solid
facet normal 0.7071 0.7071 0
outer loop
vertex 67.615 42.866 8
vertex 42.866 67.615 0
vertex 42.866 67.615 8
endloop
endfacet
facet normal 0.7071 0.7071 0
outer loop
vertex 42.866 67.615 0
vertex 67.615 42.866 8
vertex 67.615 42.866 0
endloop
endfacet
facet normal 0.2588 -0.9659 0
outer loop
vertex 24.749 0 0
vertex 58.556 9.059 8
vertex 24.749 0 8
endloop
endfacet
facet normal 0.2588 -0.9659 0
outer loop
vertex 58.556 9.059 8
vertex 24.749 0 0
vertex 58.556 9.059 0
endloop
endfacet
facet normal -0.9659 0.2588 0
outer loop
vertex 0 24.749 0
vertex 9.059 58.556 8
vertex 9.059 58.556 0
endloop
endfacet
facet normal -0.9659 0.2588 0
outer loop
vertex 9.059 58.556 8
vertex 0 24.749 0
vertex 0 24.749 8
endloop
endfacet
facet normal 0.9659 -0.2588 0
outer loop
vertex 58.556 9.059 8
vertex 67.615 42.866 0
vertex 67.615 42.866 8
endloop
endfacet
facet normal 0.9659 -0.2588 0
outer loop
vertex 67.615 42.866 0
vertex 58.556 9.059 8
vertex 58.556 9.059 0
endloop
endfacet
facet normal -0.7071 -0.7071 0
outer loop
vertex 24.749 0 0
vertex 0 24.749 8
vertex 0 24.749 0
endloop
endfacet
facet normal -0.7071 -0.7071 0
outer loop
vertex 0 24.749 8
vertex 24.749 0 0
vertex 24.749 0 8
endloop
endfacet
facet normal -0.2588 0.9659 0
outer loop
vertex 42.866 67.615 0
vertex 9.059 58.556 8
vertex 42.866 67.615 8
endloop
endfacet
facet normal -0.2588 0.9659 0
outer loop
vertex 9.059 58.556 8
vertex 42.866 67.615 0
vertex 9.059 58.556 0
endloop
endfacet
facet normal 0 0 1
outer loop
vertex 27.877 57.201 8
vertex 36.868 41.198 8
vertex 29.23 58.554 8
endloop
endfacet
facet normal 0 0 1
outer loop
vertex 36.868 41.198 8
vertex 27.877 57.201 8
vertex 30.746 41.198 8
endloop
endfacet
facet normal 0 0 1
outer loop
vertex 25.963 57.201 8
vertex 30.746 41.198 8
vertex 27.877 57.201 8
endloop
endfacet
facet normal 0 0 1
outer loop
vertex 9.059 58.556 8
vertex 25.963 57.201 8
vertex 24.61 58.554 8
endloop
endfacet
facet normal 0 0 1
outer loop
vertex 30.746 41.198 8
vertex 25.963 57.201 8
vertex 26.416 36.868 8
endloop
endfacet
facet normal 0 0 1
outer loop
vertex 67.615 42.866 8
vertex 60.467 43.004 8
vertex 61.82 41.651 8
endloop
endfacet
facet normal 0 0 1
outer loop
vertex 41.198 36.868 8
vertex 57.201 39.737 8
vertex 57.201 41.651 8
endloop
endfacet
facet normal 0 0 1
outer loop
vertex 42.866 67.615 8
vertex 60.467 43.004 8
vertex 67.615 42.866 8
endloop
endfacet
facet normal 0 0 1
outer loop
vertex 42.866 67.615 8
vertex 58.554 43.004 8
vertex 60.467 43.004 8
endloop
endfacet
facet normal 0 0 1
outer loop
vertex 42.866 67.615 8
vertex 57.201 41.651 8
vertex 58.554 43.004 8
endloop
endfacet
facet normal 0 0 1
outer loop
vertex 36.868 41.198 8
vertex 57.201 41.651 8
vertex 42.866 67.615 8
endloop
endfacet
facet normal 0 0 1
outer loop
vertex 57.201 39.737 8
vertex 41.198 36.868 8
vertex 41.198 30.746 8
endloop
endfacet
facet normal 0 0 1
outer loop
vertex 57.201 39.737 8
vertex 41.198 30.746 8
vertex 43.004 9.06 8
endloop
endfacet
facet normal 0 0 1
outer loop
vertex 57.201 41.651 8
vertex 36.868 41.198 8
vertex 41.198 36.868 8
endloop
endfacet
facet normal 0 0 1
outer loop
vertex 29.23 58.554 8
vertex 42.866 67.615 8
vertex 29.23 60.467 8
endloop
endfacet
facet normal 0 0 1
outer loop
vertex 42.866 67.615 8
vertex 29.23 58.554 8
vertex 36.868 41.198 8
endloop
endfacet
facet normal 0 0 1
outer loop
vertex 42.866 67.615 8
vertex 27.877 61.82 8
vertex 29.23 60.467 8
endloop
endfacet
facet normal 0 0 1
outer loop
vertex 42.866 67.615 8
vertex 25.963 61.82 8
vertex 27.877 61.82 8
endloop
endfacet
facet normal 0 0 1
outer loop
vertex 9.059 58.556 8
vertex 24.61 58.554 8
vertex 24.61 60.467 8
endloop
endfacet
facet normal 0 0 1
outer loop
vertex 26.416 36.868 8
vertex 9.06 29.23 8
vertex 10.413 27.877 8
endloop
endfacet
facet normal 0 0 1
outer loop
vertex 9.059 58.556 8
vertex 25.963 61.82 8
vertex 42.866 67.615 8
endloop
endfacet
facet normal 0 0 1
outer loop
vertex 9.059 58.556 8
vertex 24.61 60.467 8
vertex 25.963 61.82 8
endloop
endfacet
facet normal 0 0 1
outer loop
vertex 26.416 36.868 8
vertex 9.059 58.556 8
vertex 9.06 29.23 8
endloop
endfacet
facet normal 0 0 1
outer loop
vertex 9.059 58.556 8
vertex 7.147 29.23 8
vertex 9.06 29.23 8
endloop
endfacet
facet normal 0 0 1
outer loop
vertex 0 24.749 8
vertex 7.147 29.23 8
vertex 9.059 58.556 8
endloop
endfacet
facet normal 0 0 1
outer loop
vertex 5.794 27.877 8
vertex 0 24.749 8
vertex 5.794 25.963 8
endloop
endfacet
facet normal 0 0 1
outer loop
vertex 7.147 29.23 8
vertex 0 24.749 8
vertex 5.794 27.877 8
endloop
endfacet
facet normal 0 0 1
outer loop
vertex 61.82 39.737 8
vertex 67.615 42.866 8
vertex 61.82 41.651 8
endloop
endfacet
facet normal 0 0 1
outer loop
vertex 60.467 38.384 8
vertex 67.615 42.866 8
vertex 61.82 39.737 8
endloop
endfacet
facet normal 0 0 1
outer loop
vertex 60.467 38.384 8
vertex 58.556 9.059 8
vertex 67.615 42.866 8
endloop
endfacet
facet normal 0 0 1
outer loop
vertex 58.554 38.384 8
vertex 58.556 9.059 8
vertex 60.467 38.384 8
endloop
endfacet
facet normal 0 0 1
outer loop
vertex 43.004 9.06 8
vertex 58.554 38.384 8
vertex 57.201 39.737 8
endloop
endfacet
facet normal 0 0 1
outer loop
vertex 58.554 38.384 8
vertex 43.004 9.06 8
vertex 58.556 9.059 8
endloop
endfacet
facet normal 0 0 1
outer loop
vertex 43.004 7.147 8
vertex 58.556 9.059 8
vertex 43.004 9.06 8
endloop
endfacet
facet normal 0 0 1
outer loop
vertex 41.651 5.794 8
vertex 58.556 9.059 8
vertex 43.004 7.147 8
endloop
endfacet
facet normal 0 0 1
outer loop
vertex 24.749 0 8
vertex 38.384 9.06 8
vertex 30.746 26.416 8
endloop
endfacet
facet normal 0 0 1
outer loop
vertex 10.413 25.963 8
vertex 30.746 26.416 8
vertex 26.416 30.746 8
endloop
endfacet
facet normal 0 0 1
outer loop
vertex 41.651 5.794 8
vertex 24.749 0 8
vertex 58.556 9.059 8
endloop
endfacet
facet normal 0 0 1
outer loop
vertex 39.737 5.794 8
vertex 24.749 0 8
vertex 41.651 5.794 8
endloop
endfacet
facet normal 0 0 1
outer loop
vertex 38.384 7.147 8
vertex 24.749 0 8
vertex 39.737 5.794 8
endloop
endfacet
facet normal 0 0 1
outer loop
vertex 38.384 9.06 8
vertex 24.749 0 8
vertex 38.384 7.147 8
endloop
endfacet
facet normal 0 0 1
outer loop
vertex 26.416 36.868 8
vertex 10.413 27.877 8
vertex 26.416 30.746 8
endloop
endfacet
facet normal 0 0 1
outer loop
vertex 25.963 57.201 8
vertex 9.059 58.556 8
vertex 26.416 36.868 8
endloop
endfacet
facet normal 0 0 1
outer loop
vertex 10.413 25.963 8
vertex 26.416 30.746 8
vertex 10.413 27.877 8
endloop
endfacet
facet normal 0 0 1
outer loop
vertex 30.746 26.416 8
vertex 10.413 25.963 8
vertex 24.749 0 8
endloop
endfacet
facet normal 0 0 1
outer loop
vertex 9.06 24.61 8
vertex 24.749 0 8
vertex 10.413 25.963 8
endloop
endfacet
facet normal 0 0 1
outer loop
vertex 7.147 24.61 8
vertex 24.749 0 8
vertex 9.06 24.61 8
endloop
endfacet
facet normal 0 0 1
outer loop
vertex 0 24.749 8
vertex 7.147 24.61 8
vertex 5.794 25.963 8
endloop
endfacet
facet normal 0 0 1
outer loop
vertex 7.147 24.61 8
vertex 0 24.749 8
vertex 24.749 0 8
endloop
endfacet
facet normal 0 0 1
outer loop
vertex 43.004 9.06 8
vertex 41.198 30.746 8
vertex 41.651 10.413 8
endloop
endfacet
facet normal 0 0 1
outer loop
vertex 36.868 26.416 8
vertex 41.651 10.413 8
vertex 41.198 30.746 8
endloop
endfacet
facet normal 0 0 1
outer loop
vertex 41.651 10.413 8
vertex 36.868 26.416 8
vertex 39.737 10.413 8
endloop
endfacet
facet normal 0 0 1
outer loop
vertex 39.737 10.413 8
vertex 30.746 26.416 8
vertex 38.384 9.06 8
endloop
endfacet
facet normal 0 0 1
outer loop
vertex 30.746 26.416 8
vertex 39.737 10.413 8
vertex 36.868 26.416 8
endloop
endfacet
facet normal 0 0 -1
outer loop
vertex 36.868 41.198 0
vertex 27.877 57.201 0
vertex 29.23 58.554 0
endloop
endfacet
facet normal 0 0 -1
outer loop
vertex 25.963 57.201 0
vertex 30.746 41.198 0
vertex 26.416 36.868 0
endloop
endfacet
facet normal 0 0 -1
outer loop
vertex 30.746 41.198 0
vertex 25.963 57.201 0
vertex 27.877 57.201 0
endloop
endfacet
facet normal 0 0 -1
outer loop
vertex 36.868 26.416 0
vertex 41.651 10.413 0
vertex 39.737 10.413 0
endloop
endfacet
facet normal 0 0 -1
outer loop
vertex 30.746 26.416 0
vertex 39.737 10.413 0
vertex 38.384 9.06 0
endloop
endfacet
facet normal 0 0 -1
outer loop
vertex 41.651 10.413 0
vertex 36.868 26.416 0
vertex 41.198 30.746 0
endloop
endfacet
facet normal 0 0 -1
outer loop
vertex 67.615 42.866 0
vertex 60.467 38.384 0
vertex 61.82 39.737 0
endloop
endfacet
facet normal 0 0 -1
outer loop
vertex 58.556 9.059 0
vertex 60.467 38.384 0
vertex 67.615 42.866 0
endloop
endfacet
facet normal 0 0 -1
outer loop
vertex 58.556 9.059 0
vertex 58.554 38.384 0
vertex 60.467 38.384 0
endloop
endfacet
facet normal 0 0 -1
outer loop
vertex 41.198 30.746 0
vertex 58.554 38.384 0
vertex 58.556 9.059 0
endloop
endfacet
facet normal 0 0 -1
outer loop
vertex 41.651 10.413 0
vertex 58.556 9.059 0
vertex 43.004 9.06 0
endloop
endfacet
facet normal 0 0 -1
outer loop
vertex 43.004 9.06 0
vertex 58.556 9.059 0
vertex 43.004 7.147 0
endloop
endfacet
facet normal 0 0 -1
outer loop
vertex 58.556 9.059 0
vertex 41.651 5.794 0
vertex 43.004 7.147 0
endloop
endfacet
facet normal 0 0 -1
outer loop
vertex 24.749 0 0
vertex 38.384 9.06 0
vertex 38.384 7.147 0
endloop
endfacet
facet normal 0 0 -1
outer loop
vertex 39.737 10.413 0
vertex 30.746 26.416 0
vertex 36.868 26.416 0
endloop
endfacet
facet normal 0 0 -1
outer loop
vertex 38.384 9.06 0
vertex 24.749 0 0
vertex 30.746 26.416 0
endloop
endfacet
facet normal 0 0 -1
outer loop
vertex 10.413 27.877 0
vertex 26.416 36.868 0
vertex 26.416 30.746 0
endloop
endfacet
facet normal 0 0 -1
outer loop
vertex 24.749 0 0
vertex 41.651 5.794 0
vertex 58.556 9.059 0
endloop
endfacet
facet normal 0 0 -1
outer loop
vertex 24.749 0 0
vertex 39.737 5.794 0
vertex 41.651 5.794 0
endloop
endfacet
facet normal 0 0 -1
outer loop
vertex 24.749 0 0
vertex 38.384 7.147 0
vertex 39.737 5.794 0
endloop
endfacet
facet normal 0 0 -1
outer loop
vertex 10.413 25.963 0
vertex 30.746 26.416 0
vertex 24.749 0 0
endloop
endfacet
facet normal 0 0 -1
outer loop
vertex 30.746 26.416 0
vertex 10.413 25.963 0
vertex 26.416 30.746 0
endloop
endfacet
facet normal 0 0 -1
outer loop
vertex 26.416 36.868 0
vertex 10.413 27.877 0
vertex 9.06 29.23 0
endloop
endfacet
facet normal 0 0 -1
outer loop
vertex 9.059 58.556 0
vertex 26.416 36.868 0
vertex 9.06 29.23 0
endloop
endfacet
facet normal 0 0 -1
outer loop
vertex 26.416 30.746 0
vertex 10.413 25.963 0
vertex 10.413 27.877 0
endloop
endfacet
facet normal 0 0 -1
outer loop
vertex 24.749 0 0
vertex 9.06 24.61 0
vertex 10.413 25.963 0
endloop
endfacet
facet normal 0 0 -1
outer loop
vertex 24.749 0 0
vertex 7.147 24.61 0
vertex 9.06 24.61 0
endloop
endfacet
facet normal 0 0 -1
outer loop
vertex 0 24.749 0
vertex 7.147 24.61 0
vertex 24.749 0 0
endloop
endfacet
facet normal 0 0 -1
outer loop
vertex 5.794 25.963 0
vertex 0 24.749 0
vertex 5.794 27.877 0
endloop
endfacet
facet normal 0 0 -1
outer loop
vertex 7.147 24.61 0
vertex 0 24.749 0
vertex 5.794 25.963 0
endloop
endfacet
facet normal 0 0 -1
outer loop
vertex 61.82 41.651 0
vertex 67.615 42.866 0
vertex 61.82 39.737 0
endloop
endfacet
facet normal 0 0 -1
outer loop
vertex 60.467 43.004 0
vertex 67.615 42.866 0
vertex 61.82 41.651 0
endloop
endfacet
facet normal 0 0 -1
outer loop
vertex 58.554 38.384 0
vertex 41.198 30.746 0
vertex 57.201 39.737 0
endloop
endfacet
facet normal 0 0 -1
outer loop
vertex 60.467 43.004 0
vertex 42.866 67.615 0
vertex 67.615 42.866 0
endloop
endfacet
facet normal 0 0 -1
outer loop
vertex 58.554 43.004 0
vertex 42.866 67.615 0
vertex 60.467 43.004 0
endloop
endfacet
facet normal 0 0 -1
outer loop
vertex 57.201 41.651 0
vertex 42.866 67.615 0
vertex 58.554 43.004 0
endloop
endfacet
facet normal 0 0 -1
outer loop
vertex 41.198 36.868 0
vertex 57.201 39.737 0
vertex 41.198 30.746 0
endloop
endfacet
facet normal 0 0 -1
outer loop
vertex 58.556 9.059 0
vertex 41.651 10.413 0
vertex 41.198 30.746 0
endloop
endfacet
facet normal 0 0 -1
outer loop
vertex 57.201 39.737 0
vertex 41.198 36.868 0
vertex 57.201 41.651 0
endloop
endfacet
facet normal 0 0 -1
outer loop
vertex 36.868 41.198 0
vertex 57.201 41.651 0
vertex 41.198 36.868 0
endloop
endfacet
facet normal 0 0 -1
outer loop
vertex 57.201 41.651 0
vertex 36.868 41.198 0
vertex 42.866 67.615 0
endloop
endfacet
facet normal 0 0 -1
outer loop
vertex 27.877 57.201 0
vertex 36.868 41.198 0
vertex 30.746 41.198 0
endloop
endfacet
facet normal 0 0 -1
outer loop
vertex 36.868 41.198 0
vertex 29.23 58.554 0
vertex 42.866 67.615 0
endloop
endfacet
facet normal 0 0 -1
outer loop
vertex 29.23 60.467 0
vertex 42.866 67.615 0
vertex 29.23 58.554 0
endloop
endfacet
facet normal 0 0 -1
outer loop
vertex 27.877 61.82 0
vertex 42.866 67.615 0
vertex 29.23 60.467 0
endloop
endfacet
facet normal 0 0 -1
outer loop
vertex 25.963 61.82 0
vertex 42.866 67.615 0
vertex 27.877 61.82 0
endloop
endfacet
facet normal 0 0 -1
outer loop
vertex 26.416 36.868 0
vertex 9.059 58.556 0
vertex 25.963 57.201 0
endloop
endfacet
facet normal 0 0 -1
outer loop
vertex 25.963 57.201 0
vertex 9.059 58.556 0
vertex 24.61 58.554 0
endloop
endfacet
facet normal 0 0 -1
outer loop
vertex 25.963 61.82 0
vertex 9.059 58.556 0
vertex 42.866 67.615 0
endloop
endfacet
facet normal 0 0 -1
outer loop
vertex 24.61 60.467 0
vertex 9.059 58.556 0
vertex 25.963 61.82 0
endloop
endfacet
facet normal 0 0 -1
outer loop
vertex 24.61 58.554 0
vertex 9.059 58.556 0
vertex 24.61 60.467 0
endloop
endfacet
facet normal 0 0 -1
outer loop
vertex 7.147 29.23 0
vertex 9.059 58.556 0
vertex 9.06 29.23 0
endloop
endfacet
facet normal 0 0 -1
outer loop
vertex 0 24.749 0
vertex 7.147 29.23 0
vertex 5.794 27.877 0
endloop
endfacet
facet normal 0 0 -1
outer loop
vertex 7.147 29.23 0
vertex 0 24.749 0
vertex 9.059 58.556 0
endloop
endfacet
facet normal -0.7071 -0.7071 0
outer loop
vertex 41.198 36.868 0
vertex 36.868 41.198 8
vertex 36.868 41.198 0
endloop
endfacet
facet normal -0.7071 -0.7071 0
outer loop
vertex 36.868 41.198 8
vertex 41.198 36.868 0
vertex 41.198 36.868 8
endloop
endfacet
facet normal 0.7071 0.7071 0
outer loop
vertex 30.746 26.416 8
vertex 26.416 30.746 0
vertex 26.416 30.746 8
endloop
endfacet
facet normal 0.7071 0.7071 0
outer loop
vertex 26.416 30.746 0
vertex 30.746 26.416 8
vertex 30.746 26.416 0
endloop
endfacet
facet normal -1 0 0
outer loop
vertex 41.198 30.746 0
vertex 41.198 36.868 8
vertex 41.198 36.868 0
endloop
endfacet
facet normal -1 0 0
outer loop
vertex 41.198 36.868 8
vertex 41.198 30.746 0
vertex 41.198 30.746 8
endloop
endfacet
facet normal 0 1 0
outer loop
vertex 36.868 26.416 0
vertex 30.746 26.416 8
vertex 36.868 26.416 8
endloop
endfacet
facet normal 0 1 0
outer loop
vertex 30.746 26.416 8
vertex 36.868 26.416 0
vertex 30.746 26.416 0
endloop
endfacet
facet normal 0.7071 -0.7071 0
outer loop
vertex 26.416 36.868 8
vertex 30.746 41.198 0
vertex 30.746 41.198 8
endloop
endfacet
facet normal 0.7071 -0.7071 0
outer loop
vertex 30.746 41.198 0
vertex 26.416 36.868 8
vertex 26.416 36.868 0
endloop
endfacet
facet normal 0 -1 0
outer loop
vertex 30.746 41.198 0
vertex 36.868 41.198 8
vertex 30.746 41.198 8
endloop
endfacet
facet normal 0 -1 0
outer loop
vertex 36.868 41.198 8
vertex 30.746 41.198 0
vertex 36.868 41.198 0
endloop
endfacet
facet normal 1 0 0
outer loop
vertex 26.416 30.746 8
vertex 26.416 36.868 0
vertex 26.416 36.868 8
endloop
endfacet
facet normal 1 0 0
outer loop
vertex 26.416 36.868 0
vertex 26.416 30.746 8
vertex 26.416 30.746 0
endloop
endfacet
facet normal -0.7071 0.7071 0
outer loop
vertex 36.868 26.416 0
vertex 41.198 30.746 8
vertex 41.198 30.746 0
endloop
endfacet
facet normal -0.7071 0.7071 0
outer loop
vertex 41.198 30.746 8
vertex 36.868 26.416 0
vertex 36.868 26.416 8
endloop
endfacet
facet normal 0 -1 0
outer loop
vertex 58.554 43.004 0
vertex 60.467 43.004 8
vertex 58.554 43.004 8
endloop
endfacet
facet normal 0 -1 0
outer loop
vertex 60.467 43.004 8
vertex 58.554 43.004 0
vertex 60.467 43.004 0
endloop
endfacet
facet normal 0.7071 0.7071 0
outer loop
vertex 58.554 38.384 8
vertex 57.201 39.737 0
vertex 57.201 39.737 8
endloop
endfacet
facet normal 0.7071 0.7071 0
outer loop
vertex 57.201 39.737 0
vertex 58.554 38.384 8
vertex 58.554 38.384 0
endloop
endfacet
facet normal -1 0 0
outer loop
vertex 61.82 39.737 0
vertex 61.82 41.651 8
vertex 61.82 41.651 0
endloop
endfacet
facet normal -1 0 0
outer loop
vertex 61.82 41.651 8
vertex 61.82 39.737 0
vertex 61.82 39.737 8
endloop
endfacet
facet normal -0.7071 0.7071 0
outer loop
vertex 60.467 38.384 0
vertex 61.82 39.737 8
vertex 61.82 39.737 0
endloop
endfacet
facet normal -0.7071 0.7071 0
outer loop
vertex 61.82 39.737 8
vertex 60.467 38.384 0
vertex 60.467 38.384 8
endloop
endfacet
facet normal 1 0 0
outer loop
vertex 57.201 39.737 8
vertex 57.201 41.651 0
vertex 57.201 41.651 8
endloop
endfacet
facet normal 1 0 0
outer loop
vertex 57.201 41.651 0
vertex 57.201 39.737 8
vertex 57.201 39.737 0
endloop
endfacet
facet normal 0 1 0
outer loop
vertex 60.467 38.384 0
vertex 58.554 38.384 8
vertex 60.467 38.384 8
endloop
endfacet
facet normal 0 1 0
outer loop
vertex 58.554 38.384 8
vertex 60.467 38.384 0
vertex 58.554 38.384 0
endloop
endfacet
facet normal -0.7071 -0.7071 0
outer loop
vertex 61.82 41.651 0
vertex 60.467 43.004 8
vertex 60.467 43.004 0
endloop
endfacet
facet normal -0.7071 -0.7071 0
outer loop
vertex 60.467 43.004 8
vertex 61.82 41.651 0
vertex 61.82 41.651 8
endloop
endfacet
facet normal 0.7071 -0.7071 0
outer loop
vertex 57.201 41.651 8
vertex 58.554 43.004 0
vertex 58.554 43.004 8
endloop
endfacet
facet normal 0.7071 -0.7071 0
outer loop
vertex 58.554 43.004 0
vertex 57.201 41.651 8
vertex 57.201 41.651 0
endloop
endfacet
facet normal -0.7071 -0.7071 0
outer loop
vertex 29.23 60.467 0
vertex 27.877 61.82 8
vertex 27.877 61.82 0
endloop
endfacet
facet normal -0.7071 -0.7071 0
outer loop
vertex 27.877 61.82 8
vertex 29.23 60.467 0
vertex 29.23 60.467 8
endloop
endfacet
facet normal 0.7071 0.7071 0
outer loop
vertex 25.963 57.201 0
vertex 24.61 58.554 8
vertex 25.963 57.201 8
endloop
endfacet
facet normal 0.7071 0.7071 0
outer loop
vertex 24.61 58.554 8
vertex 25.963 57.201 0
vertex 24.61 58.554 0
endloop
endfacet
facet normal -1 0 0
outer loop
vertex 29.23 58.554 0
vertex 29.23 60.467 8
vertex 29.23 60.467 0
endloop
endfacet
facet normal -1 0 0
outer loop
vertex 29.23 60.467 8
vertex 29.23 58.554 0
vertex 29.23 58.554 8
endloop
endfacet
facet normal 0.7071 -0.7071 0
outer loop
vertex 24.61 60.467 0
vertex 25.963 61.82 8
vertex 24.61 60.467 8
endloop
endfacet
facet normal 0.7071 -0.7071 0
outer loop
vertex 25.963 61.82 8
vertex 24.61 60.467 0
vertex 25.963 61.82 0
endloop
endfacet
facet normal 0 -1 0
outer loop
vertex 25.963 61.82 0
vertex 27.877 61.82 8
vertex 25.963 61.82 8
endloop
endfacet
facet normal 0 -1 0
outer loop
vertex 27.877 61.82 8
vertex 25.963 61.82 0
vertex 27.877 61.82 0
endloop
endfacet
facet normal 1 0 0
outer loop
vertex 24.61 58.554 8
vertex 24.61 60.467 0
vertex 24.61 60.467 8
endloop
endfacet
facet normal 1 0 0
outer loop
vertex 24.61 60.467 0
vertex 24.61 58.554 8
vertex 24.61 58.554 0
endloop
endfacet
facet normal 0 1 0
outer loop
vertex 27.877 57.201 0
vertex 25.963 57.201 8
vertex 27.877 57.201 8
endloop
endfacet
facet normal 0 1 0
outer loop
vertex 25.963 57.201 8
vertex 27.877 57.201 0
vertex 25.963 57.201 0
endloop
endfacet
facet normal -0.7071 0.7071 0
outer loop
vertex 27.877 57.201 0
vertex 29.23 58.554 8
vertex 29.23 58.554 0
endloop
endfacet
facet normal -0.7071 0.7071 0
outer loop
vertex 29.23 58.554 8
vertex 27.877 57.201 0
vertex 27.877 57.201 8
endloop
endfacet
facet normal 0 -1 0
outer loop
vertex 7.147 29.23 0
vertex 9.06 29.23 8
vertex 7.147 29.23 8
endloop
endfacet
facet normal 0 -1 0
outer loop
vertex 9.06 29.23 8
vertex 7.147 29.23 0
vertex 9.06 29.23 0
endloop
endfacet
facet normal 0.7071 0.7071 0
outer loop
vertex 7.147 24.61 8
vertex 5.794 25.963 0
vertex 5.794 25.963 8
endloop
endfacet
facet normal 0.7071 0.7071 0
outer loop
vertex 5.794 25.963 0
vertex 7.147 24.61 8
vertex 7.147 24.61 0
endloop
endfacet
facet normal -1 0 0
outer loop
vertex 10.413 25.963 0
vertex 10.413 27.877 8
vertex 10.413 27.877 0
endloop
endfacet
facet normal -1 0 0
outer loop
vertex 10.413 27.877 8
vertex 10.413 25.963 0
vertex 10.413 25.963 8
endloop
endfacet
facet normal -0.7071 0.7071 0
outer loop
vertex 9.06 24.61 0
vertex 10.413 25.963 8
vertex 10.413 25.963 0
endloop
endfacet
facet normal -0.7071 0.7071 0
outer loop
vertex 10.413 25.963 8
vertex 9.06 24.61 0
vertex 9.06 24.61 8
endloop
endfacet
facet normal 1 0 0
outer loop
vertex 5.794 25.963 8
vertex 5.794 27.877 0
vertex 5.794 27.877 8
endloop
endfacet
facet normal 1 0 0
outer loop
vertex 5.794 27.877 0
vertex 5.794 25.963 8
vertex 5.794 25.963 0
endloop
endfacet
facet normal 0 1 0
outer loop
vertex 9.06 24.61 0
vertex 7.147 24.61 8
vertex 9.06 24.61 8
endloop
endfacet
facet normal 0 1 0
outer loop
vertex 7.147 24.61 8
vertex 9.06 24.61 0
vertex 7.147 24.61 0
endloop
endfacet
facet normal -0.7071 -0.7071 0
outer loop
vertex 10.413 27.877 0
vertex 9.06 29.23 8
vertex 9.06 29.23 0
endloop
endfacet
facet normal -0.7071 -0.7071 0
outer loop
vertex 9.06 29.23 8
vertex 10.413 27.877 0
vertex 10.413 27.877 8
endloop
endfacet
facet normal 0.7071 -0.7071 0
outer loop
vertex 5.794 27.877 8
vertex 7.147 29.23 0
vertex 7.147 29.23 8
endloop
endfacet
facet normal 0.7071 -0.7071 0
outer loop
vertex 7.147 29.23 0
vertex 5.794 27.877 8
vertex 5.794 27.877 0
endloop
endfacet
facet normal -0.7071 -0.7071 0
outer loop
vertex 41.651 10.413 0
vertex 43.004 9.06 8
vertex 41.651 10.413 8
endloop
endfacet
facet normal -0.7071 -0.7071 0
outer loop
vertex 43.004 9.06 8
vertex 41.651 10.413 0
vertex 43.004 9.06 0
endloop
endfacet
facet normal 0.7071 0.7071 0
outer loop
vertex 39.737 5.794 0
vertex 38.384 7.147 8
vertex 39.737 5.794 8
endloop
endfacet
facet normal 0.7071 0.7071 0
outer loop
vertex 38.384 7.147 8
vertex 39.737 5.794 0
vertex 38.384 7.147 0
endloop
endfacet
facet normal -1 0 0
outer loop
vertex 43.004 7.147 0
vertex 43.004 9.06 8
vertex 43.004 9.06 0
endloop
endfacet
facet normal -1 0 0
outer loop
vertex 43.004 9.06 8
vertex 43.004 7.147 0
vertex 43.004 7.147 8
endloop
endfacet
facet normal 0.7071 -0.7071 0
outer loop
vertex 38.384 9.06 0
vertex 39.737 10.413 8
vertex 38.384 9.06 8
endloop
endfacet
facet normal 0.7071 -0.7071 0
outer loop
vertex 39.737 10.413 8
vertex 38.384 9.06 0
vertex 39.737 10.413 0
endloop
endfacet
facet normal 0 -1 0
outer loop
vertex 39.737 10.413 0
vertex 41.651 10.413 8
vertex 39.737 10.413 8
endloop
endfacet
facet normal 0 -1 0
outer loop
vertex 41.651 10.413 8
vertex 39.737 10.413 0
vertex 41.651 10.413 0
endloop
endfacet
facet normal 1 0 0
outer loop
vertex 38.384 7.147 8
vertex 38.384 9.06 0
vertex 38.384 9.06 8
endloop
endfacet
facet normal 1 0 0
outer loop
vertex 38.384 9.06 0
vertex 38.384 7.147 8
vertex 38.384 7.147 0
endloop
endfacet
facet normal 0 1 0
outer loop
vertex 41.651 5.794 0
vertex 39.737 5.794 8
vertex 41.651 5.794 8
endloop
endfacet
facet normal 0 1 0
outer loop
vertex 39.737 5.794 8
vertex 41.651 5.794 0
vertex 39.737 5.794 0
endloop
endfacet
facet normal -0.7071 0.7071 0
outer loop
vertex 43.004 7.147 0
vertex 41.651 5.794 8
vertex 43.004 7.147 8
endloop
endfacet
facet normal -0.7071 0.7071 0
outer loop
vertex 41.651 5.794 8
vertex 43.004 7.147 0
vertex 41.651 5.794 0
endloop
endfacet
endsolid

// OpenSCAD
$fn = 32;

// ----------------------------------------------------------------------
// Polygon plate: 6-gon R35, 4 bolt windows
// ----------------------------------------------------------------------

// --- parameters (mm) ---
sides = 6;                // number of polygon sides
plate_r = 35;             // circumscribed radius of the polygon
bore_r = 8;               // centre bore radius
bolts = 4;                // number of bolt windows
ring_r = 26.61;           // bolt-circle radius
bolt_r = 2.5;             // bolt window radius
plate_t = 8;              // plate thickness, Z (extrusion height)

plate_d = 2 * plate_r;  // circumscribed diameter
bore_d = 2 * bore_r;  // centre bore diameter
bolt_d = 2 * bolt_r;  // bolt window diameter
ring_d = 2 * ring_r;  // bolt-circle diameter

profile = [[67.615, 42.866], [42.866, 67.615], [9.059, 58.556], [0, 24.749], [24.749, 0], [58.556, 9.059]];  // primary outline, 6 points, counter clockwise
void_1 = [[41.198, 36.868], [36.868, 41.198], [30.746, 41.198], [26.416, 36.868], [26.416, 30.746], [30.746, 26.416], [36.868, 26.416], [41.198, 30.746]];  // centre bore, 8 points
void_2 = [[61.82, 41.651], [60.467, 43.004], [58.554, 43.004], [57.201, 41.651], [57.201, 39.737], [58.554, 38.384], [60.467, 38.384], [61.82, 39.737]];  // bolt window 1, 8 points
void_3 = [[29.23, 60.467], [27.877, 61.82], [25.963, 61.82], [24.61, 60.467], [24.61, 58.554], [25.963, 57.201], [27.877, 57.201], [29.23, 58.554]];  // bolt window 2, 8 points
void_4 = [[10.413, 27.877], [9.06, 29.23], [7.147, 29.23], [5.794, 27.877], [5.794, 25.963], [7.147, 24.61], [9.06, 24.61], [10.413, 25.963]];  // bolt window 3, 8 points
void_5 = [[43.004, 9.06], [41.651, 10.413], [39.737, 10.413], [38.384, 9.06], [38.384, 7.147], [39.737, 5.794], [41.651, 5.794], [43.004, 7.147]];  // bolt window 4, 8 points

// --- the one profile operation ---
difference() {
  linear_extrude(height = plate_t) polygon(points = profile);
  translate([0, 0, -1])
    linear_extrude(height = plate_t + 2) polygon(points = void_1);
  translate([0, 0, -1])
    linear_extrude(height = plate_t + 2) polygon(points = void_2);
  translate([0, 0, -1])
    linear_extrude(height = plate_t + 2) polygon(points = void_3);
  translate([0, 0, -1])
    linear_extrude(height = plate_t + 2) polygon(points = void_4);
  translate([0, 0, -1])
    linear_extrude(height = plate_t + 2) polygon(points = void_5);
}
